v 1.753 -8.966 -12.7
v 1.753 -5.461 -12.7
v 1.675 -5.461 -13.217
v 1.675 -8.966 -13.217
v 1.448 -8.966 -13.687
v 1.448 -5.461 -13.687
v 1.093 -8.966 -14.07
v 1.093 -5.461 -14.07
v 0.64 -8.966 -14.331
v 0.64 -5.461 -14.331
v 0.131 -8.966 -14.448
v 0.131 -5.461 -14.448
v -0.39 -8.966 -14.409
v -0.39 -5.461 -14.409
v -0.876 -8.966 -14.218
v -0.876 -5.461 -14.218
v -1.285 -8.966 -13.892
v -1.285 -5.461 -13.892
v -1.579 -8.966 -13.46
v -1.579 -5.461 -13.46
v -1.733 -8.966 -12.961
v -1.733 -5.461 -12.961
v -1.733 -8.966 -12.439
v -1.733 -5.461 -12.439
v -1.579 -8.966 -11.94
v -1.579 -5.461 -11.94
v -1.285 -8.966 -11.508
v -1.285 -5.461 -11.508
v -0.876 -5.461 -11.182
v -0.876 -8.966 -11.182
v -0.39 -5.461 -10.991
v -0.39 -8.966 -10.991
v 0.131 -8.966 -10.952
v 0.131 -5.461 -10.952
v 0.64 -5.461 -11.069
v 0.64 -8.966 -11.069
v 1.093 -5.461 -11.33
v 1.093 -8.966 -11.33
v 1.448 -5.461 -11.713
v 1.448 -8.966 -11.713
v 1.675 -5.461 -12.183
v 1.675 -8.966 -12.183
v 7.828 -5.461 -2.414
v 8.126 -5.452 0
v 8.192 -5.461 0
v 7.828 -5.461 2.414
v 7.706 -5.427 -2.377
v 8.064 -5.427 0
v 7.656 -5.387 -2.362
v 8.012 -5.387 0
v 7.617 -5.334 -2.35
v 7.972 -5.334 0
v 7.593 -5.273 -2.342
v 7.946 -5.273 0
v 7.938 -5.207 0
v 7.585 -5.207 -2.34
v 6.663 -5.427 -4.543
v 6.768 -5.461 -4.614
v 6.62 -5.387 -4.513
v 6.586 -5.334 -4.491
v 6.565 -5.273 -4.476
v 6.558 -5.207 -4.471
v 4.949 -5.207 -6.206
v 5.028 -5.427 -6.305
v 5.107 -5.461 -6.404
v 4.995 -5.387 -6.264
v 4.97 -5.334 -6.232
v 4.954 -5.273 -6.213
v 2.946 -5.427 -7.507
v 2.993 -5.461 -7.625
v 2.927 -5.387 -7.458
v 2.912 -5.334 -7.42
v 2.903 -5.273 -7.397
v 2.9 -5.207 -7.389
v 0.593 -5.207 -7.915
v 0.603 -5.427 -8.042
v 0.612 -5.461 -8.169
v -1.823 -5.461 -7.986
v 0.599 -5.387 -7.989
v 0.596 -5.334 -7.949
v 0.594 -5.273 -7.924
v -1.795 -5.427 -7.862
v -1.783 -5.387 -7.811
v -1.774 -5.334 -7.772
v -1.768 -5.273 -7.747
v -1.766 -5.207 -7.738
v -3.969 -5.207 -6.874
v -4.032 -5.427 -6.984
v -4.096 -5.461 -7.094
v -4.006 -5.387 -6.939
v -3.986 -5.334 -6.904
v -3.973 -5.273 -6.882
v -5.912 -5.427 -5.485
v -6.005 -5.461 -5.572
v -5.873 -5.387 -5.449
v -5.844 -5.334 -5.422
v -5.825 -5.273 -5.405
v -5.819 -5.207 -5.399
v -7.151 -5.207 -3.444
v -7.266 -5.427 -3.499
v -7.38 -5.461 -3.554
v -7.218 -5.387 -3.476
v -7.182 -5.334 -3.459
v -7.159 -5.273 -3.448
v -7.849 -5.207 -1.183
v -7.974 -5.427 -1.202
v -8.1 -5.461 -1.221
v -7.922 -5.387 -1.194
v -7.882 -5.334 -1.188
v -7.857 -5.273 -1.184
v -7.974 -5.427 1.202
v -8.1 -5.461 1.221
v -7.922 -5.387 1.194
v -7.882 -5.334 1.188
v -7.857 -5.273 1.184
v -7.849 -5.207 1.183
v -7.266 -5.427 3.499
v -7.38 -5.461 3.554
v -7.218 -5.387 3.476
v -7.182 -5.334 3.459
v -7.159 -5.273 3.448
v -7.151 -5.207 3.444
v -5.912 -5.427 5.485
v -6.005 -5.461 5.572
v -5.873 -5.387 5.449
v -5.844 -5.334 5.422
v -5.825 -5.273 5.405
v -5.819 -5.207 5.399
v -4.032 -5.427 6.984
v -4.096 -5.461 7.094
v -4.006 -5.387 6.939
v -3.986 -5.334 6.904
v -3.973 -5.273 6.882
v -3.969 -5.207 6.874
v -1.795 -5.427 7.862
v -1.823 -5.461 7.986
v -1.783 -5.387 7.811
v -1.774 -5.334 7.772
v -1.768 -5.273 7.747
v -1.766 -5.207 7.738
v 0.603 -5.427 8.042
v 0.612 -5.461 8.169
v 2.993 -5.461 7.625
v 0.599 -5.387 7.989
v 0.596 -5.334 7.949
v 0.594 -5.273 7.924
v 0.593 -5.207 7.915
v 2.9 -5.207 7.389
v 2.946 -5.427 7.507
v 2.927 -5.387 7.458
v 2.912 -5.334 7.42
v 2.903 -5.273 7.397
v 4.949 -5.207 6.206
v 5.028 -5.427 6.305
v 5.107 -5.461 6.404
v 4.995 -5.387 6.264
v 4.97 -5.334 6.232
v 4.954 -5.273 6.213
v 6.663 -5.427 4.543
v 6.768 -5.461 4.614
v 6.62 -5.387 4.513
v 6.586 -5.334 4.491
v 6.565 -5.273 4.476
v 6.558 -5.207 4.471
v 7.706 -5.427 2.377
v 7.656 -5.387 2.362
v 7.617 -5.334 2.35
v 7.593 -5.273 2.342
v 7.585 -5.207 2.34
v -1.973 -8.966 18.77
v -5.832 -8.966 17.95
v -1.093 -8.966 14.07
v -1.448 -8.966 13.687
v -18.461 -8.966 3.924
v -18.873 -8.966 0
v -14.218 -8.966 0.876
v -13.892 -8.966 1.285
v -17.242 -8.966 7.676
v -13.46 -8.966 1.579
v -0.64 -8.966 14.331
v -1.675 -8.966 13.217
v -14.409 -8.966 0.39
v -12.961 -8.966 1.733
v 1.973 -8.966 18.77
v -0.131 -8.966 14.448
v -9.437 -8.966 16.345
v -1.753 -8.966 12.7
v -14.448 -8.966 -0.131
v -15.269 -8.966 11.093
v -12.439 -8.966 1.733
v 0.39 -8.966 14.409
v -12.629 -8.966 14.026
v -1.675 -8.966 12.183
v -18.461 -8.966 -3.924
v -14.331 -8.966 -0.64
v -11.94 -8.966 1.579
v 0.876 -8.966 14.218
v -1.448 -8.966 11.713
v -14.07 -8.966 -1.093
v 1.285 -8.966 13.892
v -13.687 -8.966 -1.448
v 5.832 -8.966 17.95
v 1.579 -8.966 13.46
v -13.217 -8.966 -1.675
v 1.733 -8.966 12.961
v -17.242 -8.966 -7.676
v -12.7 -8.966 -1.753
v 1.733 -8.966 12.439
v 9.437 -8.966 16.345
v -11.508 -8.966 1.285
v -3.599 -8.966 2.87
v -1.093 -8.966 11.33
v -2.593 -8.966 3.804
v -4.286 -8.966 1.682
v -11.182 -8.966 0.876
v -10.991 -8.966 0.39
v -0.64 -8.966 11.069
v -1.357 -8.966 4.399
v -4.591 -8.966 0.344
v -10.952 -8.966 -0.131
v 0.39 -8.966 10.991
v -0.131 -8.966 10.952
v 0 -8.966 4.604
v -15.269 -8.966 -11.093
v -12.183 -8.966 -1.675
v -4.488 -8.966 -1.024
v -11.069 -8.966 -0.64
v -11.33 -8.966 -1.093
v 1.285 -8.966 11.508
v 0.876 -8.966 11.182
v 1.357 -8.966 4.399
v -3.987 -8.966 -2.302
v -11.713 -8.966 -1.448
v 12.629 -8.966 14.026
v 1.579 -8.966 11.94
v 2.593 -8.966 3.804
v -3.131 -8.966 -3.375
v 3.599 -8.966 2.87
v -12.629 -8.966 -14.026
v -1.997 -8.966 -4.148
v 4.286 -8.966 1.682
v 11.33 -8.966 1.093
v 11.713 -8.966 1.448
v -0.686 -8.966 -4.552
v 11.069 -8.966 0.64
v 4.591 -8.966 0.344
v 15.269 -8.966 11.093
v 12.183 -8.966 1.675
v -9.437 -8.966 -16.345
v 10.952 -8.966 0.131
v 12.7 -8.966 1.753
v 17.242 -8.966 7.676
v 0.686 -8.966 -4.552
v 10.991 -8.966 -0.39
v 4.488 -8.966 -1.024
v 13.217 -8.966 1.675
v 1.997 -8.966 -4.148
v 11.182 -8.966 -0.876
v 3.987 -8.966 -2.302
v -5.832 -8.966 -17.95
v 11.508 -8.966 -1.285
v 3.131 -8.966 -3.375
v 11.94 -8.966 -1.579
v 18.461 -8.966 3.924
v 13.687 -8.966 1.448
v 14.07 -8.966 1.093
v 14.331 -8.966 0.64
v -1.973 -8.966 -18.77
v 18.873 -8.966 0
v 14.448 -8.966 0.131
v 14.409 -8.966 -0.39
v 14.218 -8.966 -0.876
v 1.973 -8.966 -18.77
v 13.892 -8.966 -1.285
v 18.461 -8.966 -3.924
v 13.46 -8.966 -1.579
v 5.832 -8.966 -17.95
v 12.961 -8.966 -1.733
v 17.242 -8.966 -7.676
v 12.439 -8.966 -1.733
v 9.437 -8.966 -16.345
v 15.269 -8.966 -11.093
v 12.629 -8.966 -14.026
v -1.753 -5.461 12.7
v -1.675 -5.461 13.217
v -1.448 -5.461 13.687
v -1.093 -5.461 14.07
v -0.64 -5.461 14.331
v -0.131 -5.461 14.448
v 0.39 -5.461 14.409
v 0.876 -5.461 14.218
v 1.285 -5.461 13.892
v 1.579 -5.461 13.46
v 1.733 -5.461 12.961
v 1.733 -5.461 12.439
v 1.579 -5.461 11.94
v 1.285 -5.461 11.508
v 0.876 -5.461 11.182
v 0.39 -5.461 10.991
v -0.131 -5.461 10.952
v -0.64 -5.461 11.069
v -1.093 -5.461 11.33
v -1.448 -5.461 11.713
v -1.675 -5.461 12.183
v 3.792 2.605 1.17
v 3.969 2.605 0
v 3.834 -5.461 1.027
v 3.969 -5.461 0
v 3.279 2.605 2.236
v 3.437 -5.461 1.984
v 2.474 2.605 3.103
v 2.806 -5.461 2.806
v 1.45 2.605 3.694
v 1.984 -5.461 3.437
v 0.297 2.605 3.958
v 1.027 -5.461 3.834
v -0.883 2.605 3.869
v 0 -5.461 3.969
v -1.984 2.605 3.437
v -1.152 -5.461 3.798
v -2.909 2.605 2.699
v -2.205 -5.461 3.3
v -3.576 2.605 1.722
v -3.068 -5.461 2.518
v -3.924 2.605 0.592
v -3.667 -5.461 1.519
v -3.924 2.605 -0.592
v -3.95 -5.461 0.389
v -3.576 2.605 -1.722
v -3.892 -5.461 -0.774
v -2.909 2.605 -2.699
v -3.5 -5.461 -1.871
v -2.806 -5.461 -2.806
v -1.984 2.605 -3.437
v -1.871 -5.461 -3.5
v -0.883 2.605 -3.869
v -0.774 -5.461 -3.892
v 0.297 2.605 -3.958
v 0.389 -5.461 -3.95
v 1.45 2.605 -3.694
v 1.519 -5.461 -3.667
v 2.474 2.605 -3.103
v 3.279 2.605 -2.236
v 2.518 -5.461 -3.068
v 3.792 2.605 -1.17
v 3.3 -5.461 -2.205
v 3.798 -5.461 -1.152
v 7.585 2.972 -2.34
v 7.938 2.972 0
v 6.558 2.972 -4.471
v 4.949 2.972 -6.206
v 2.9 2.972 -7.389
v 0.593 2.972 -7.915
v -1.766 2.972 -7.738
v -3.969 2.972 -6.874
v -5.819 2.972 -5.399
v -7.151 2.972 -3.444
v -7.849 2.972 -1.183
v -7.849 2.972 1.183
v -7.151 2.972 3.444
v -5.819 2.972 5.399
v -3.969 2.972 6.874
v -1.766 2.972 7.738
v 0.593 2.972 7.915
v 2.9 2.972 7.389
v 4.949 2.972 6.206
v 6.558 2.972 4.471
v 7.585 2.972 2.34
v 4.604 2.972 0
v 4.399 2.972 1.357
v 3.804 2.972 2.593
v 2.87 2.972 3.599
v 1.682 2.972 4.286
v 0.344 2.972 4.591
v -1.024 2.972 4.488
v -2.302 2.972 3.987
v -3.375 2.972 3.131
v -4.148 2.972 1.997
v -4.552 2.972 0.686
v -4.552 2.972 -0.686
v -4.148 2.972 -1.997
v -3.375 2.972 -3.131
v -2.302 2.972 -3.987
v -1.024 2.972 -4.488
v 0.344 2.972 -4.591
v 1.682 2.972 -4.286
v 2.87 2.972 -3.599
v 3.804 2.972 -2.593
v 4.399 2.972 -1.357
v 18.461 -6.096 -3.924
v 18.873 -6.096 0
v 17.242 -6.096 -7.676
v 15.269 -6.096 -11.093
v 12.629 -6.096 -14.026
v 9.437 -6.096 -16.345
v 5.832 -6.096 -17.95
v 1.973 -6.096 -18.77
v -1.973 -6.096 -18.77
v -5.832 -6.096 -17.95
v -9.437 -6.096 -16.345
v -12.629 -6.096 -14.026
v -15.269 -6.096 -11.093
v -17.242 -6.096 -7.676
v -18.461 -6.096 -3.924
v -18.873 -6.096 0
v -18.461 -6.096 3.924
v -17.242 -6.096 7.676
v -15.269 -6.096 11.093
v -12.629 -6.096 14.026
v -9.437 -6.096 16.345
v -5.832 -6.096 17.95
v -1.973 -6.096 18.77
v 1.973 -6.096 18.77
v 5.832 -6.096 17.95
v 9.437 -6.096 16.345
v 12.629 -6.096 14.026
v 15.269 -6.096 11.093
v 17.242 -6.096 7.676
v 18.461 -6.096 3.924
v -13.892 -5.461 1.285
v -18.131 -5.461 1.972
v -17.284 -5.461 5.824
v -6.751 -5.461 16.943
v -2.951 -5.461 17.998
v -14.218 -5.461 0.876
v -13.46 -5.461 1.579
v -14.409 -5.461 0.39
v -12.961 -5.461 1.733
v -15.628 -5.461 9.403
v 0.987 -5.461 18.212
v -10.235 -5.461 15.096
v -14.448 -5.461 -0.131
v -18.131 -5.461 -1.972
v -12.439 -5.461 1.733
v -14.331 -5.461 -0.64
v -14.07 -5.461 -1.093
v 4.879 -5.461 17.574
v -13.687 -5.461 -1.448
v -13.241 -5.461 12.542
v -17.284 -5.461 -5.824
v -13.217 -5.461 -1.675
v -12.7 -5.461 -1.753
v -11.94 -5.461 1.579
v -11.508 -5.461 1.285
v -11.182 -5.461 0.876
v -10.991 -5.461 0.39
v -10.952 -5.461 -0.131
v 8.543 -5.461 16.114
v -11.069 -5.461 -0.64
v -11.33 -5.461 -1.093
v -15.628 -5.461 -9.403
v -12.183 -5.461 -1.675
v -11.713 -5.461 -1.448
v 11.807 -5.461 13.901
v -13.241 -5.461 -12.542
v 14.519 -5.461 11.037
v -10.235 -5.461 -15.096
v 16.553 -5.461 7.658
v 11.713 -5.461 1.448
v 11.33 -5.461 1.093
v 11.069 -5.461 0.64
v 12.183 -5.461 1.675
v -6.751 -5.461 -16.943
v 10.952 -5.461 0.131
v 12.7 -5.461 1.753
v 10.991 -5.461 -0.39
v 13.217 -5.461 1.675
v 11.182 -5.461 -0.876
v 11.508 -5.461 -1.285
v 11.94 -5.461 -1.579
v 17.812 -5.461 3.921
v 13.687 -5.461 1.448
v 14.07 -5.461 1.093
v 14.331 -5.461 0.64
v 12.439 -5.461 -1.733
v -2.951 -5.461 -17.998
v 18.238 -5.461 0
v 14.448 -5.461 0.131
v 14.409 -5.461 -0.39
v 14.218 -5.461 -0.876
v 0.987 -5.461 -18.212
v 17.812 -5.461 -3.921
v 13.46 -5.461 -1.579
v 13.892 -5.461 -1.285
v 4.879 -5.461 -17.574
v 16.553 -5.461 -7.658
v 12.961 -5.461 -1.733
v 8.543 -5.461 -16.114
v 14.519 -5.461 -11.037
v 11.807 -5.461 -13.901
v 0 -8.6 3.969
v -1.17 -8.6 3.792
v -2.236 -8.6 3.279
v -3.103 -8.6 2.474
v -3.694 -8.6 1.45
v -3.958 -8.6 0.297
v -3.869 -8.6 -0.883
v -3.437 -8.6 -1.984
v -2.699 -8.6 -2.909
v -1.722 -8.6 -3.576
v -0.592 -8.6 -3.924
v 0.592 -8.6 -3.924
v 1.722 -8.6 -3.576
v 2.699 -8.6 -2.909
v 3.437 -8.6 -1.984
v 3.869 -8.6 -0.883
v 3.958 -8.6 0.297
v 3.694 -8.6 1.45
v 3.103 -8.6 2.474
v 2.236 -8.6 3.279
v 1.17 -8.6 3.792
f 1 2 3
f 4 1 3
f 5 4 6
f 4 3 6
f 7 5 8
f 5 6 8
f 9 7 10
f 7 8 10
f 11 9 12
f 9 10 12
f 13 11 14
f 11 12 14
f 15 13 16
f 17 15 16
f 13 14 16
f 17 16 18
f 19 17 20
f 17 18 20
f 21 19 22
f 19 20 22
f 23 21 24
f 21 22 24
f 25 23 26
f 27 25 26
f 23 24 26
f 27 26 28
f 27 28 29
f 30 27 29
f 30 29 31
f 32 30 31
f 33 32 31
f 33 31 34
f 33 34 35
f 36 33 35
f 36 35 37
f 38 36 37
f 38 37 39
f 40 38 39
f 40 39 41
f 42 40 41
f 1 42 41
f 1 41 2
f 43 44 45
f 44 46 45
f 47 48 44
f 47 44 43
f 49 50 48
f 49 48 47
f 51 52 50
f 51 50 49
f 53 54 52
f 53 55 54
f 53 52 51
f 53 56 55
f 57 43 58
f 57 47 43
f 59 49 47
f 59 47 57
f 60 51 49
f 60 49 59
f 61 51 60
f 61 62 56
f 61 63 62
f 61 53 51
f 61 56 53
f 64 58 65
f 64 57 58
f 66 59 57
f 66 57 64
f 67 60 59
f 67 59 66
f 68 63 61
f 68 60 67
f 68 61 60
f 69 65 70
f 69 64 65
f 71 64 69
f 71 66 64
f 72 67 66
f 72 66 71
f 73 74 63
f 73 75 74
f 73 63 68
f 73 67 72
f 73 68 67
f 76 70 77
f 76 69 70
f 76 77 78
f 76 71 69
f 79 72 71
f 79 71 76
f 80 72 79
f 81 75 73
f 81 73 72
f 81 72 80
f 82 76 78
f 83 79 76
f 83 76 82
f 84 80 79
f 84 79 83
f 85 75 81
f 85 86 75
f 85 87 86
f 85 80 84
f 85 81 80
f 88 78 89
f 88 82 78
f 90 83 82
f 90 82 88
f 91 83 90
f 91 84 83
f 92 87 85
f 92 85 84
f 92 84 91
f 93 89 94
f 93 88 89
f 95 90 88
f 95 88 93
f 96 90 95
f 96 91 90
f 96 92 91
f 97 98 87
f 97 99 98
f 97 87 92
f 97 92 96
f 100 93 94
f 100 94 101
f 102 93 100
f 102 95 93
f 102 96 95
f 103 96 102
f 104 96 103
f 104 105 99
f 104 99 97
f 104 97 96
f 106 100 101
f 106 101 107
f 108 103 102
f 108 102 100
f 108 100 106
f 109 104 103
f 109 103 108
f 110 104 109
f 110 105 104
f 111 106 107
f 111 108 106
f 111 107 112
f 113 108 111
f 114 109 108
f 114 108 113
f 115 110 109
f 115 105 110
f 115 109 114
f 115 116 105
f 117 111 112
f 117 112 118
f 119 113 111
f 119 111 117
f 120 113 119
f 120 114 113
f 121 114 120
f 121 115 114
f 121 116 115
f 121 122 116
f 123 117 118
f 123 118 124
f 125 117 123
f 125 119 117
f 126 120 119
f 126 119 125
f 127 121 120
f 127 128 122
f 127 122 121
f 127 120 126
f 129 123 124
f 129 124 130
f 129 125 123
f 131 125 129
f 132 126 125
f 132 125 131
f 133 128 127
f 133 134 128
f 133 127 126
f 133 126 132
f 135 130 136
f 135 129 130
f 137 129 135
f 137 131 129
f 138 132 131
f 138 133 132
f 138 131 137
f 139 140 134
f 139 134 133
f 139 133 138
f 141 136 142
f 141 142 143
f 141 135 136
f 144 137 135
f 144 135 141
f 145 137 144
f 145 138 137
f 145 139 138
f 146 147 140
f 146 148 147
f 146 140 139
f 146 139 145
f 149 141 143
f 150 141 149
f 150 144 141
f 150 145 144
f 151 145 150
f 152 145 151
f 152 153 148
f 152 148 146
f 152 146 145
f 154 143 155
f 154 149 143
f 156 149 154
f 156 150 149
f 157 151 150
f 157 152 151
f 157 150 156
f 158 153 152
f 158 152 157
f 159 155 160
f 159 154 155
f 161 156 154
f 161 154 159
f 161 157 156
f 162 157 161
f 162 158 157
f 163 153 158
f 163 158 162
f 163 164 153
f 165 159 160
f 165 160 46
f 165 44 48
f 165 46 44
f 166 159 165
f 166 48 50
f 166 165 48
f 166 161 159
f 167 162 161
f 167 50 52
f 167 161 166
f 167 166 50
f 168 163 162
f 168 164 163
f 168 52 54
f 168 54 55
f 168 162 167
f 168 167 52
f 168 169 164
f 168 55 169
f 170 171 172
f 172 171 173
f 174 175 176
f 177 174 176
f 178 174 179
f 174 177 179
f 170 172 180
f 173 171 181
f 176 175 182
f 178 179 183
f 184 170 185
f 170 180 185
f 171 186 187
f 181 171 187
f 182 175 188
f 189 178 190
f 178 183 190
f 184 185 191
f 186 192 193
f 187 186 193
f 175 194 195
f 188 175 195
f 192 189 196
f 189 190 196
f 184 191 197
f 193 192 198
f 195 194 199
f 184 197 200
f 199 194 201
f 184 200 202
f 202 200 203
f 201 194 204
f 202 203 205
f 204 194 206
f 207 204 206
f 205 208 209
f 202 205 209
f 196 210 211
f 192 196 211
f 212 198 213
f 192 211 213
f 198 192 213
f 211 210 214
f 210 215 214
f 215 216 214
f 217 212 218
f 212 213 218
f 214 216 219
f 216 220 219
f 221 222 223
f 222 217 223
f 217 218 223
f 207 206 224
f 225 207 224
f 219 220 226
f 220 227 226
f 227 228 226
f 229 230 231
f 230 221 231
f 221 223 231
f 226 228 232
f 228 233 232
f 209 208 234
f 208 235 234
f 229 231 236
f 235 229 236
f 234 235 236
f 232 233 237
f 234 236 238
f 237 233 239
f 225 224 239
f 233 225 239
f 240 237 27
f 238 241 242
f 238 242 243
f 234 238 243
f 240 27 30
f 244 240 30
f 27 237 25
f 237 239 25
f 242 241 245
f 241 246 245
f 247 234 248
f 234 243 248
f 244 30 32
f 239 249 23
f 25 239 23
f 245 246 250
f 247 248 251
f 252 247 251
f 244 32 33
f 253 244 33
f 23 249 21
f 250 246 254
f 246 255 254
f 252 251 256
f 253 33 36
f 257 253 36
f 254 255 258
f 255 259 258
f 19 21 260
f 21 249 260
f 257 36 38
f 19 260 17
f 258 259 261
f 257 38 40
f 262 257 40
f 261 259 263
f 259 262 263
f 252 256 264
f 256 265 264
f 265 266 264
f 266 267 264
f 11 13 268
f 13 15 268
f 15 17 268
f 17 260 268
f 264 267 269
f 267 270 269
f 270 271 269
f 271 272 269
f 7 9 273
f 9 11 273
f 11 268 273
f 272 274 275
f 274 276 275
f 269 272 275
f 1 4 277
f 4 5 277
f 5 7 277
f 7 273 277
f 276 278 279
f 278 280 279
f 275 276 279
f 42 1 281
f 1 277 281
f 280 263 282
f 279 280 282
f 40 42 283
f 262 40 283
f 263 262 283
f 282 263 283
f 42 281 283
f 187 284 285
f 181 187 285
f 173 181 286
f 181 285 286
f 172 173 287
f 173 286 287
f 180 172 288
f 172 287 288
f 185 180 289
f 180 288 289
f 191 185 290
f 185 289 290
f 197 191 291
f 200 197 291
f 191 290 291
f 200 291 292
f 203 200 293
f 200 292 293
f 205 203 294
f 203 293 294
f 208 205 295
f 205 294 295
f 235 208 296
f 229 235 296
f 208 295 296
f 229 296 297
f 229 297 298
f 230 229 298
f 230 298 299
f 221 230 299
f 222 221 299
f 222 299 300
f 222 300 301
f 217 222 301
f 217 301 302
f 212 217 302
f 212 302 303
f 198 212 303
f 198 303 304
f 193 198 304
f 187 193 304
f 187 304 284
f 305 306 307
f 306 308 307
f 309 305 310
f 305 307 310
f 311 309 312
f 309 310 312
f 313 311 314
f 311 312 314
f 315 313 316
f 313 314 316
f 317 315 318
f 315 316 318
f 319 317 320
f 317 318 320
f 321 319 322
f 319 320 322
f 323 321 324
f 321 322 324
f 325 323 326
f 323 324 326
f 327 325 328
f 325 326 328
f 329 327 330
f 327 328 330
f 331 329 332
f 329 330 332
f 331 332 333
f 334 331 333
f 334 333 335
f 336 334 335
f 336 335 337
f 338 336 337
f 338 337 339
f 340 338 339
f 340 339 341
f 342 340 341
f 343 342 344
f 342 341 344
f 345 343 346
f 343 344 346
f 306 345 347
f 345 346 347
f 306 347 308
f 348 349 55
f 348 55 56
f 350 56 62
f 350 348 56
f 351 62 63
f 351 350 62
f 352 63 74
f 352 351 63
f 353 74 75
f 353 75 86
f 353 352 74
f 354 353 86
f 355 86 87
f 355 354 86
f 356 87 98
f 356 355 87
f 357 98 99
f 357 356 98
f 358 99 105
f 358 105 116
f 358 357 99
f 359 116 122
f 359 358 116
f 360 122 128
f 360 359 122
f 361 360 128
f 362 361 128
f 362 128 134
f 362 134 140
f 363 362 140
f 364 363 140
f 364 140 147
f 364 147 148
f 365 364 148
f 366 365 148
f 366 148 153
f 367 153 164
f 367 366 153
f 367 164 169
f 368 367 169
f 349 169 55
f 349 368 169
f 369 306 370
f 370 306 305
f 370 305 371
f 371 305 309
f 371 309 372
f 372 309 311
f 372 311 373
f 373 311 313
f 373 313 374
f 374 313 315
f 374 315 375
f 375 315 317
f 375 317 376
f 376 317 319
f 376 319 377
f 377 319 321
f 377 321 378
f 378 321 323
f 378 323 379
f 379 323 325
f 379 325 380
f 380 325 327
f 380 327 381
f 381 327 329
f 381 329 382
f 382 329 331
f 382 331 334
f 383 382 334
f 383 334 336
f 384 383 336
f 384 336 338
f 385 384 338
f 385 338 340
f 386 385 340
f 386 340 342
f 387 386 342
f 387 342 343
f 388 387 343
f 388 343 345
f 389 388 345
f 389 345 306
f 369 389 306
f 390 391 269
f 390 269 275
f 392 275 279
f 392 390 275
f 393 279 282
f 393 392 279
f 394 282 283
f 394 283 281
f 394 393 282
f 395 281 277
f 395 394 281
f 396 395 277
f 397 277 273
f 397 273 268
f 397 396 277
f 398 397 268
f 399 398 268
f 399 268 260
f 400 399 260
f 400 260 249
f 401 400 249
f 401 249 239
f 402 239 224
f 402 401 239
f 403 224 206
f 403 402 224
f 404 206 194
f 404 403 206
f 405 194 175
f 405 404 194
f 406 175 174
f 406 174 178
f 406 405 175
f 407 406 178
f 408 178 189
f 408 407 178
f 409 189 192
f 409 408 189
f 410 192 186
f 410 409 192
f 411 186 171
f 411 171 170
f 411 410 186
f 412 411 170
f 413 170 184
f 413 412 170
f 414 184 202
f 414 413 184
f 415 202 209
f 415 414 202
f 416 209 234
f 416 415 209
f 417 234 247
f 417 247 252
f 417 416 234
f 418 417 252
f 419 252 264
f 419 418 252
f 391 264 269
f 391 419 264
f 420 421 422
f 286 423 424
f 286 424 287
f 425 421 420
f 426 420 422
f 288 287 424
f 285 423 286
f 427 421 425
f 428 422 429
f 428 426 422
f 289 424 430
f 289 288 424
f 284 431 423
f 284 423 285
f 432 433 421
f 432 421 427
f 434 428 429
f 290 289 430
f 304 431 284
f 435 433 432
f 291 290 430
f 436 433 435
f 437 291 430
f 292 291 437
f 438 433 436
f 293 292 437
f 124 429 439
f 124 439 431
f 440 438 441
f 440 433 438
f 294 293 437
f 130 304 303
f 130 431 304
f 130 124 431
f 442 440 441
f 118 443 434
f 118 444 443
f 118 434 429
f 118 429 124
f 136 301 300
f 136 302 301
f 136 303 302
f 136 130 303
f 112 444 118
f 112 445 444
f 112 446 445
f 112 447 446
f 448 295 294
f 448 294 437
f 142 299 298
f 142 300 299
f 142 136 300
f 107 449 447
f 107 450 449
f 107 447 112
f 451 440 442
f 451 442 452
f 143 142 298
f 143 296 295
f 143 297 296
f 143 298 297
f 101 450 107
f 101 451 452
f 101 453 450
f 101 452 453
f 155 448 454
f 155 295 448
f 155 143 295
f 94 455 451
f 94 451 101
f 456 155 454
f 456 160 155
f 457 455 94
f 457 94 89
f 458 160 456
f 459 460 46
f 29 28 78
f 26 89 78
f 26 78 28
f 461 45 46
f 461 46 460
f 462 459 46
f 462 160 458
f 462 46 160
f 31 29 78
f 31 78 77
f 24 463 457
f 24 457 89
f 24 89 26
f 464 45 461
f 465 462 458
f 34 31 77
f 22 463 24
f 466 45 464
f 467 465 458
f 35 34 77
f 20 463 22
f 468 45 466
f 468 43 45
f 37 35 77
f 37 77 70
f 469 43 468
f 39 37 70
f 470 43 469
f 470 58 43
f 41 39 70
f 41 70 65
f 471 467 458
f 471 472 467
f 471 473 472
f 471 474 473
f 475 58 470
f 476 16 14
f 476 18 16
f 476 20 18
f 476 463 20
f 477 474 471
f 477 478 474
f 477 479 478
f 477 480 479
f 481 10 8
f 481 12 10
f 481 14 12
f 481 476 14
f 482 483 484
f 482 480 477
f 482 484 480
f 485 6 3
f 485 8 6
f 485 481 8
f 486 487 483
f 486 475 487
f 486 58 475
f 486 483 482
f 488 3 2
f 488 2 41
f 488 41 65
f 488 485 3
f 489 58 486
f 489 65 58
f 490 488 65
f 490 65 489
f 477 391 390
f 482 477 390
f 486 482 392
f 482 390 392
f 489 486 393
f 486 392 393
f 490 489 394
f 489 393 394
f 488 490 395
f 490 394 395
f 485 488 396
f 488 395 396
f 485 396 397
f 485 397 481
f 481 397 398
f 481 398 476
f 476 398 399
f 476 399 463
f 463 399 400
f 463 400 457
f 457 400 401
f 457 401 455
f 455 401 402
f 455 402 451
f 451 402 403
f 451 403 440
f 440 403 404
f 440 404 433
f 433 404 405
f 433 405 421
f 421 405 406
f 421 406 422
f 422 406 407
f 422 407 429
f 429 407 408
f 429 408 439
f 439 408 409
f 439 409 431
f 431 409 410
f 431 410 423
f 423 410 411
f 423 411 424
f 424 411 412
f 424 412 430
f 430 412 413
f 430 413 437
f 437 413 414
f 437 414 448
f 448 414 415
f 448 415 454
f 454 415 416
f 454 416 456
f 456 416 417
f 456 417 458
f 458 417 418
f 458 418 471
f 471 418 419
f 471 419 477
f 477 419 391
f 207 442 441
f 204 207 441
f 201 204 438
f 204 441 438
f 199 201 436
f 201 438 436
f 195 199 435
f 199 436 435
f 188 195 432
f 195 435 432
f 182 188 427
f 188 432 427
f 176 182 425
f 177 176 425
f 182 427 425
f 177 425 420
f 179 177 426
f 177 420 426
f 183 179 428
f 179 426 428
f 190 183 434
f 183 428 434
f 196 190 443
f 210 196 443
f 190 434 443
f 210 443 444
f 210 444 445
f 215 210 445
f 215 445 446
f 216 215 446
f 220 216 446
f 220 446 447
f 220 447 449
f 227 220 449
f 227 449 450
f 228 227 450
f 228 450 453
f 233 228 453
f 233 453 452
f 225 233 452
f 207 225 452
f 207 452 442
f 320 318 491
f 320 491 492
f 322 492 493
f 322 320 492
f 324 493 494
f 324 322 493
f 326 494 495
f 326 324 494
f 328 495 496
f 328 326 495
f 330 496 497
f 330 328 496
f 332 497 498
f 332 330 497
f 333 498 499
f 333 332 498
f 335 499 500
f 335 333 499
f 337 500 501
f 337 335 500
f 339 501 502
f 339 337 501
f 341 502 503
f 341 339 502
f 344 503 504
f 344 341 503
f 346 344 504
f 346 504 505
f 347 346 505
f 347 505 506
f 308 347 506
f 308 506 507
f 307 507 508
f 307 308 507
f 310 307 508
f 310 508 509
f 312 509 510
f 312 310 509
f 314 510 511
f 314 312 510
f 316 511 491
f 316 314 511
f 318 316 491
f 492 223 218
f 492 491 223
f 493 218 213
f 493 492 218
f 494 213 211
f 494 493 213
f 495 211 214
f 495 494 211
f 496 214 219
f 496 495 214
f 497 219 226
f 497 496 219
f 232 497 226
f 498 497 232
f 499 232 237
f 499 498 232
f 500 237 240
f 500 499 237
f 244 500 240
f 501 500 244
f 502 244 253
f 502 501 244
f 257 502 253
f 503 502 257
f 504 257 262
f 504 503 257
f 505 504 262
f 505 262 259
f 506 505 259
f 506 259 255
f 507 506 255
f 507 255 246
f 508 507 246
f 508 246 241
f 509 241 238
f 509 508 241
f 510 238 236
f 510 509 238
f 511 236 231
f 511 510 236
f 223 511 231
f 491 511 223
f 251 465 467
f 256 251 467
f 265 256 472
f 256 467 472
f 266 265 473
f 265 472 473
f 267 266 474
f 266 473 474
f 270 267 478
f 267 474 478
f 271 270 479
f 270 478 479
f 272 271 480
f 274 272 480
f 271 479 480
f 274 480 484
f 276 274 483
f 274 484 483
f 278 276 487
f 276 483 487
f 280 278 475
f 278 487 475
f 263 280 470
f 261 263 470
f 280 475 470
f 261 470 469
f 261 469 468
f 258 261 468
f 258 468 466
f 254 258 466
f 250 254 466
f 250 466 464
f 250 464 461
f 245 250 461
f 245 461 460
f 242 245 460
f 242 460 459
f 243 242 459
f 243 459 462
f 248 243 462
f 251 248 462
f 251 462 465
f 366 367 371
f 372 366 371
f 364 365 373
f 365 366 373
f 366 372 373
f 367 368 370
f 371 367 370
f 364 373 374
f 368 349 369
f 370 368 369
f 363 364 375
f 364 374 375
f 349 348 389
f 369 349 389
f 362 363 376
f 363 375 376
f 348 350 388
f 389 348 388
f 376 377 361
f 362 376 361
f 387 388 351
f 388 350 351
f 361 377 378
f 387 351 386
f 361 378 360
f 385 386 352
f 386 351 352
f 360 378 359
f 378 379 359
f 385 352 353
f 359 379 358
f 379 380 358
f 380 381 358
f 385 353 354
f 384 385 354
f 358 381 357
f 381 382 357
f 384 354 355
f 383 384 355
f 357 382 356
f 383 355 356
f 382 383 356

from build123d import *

# Parameters (mm, degrees)
SKETCH1_W                          = 8.4328
SKETCH1_H                          = 7.9375
F_5_16_24_TAPPED_HOLE1_D           = 7.9375
F_5_16_24_TAPPED_HOLE1_DEPTH       = 8.4328
F_5_16_24_TAPPED_HOLE1_CSINK_D     = 9.2075
F_5_16_24_TAPPED_HOLE1_CSINK_ANGLE = 120
SKETCH4_W                          = 18.873319712
SKETCH4_H                          = 3.5052
FILLET1_R                          = 0.254
F_6_32_TAPPED_HOLE1_D              = 3.5052
F_6_32_TAPPED_HOLE1_DEPTH          = 3.5062
CIRPATTERN1_COUNT                  = 4
CHAMFER1_SIZE                      = 0.635


with BuildPart() as part:
    # Sketch1 → Base-Revolve (revolve)
    with BuildSketch(Plane(origin=(0, 0, 0), x_dir=(0, 1, 0), z_dir=(0, 0, 1)), mode=Mode.PRIVATE) as base_revolve_sk:
        with Locations((-1.2446, 3.96875)):
            Rectangle(SKETCH1_W, SKETCH1_H)
    revolve(base_revolve_sk.sketch.rotate(Axis((0, -5.461, 0), (0, 1, 0)), 180), axis=Axis((0, -5.461, 0), (0, 1, 0)))  # turned: the seam where the file's is

    # 5_16-24 Tapped Hole1
    with Locations(Plane(origin=(0, 2.9718, 0), x_dir=(-1, 0, 0), z_dir=(0, 1, 0))):
        with Locations((0, 0)):
            CounterSinkHole(F_5_16_24_TAPPED_HOLE1_D / 2, F_5_16_24_TAPPED_HOLE1_CSINK_D / 2, depth=F_5_16_24_TAPPED_HOLE1_DEPTH, counter_sink_angle=F_5_16_24_TAPPED_HOLE1_CSINK_ANGLE)

    # Sketch4 → Revolve1 (revolve)
    with BuildSketch(Plane.XY, mode=Mode.PRIVATE) as revolve1_sk:
        with Locations((-9.436659856, -7.2136)):
            Rectangle(SKETCH4_W, SKETCH4_H)
    revolve(revolve1_sk.sketch.rotate(Axis((0, -29.193959905, 0), (0, 1, 0)), 180), axis=Axis((0, -29.193959905, 0), (0, 1, 0)))  # turned: the seam where the file's is

    # Sketch5 → 5_16-18 Tapped Hole2 (revolve, cut)
    with BuildSketch(Plane(origin=(0, -5.461, 0), x_dir=(0, 0, 1), z_dir=(1, 0, 0))):
        Polygon((0, 0), (0, 3.5052), (4.60375, 3.5052), (3.96875, 3.138582579), (3.96875, 0), align=None)
    revolve(axis=Axis((0, 0.889, 0), (0, -1, 0)), mode=Mode.SUBTRACT)

    # Fillet1
    fillet1_edges = [part.edges().sort_by_distance(p)[0] for p in [
        (-7.9375, -5.461, 0),
    ]]
    fillet(fillet1_edges, radius=FILLET1_R)

    # 6-32 Tapped Hole1
    with Locations(Plane.XZ.offset(8.9662)):
        with Locations((0, 12.7)):
            f_6_32_tapped_hole1 = Hole(F_6_32_TAPPED_HOLE1_D / 2, depth=F_6_32_TAPPED_HOLE1_DEPTH)

    # CirPattern1: 6-32 Tapped Hole1 ×4 about axis
    cirpattern1_axis = Axis((0, 0, 0), (0, 1, 0))
    for i in range(1, CIRPATTERN1_COUNT):
        add(f_6_32_tapped_hole1.rotate(cirpattern1_axis, i * 360 / CIRPATTERN1_COUNT), mode=Mode.SUBTRACT)

    # Chamfer1
    chamfer1_edges = [part.edges().sort_by_distance(p)[0] for p in [
        (-18.873319712, -5.461, 0),
    ]]
    chamfer(chamfer1_edges, length=CHAMFER1_SIZE)


solid = part.part
